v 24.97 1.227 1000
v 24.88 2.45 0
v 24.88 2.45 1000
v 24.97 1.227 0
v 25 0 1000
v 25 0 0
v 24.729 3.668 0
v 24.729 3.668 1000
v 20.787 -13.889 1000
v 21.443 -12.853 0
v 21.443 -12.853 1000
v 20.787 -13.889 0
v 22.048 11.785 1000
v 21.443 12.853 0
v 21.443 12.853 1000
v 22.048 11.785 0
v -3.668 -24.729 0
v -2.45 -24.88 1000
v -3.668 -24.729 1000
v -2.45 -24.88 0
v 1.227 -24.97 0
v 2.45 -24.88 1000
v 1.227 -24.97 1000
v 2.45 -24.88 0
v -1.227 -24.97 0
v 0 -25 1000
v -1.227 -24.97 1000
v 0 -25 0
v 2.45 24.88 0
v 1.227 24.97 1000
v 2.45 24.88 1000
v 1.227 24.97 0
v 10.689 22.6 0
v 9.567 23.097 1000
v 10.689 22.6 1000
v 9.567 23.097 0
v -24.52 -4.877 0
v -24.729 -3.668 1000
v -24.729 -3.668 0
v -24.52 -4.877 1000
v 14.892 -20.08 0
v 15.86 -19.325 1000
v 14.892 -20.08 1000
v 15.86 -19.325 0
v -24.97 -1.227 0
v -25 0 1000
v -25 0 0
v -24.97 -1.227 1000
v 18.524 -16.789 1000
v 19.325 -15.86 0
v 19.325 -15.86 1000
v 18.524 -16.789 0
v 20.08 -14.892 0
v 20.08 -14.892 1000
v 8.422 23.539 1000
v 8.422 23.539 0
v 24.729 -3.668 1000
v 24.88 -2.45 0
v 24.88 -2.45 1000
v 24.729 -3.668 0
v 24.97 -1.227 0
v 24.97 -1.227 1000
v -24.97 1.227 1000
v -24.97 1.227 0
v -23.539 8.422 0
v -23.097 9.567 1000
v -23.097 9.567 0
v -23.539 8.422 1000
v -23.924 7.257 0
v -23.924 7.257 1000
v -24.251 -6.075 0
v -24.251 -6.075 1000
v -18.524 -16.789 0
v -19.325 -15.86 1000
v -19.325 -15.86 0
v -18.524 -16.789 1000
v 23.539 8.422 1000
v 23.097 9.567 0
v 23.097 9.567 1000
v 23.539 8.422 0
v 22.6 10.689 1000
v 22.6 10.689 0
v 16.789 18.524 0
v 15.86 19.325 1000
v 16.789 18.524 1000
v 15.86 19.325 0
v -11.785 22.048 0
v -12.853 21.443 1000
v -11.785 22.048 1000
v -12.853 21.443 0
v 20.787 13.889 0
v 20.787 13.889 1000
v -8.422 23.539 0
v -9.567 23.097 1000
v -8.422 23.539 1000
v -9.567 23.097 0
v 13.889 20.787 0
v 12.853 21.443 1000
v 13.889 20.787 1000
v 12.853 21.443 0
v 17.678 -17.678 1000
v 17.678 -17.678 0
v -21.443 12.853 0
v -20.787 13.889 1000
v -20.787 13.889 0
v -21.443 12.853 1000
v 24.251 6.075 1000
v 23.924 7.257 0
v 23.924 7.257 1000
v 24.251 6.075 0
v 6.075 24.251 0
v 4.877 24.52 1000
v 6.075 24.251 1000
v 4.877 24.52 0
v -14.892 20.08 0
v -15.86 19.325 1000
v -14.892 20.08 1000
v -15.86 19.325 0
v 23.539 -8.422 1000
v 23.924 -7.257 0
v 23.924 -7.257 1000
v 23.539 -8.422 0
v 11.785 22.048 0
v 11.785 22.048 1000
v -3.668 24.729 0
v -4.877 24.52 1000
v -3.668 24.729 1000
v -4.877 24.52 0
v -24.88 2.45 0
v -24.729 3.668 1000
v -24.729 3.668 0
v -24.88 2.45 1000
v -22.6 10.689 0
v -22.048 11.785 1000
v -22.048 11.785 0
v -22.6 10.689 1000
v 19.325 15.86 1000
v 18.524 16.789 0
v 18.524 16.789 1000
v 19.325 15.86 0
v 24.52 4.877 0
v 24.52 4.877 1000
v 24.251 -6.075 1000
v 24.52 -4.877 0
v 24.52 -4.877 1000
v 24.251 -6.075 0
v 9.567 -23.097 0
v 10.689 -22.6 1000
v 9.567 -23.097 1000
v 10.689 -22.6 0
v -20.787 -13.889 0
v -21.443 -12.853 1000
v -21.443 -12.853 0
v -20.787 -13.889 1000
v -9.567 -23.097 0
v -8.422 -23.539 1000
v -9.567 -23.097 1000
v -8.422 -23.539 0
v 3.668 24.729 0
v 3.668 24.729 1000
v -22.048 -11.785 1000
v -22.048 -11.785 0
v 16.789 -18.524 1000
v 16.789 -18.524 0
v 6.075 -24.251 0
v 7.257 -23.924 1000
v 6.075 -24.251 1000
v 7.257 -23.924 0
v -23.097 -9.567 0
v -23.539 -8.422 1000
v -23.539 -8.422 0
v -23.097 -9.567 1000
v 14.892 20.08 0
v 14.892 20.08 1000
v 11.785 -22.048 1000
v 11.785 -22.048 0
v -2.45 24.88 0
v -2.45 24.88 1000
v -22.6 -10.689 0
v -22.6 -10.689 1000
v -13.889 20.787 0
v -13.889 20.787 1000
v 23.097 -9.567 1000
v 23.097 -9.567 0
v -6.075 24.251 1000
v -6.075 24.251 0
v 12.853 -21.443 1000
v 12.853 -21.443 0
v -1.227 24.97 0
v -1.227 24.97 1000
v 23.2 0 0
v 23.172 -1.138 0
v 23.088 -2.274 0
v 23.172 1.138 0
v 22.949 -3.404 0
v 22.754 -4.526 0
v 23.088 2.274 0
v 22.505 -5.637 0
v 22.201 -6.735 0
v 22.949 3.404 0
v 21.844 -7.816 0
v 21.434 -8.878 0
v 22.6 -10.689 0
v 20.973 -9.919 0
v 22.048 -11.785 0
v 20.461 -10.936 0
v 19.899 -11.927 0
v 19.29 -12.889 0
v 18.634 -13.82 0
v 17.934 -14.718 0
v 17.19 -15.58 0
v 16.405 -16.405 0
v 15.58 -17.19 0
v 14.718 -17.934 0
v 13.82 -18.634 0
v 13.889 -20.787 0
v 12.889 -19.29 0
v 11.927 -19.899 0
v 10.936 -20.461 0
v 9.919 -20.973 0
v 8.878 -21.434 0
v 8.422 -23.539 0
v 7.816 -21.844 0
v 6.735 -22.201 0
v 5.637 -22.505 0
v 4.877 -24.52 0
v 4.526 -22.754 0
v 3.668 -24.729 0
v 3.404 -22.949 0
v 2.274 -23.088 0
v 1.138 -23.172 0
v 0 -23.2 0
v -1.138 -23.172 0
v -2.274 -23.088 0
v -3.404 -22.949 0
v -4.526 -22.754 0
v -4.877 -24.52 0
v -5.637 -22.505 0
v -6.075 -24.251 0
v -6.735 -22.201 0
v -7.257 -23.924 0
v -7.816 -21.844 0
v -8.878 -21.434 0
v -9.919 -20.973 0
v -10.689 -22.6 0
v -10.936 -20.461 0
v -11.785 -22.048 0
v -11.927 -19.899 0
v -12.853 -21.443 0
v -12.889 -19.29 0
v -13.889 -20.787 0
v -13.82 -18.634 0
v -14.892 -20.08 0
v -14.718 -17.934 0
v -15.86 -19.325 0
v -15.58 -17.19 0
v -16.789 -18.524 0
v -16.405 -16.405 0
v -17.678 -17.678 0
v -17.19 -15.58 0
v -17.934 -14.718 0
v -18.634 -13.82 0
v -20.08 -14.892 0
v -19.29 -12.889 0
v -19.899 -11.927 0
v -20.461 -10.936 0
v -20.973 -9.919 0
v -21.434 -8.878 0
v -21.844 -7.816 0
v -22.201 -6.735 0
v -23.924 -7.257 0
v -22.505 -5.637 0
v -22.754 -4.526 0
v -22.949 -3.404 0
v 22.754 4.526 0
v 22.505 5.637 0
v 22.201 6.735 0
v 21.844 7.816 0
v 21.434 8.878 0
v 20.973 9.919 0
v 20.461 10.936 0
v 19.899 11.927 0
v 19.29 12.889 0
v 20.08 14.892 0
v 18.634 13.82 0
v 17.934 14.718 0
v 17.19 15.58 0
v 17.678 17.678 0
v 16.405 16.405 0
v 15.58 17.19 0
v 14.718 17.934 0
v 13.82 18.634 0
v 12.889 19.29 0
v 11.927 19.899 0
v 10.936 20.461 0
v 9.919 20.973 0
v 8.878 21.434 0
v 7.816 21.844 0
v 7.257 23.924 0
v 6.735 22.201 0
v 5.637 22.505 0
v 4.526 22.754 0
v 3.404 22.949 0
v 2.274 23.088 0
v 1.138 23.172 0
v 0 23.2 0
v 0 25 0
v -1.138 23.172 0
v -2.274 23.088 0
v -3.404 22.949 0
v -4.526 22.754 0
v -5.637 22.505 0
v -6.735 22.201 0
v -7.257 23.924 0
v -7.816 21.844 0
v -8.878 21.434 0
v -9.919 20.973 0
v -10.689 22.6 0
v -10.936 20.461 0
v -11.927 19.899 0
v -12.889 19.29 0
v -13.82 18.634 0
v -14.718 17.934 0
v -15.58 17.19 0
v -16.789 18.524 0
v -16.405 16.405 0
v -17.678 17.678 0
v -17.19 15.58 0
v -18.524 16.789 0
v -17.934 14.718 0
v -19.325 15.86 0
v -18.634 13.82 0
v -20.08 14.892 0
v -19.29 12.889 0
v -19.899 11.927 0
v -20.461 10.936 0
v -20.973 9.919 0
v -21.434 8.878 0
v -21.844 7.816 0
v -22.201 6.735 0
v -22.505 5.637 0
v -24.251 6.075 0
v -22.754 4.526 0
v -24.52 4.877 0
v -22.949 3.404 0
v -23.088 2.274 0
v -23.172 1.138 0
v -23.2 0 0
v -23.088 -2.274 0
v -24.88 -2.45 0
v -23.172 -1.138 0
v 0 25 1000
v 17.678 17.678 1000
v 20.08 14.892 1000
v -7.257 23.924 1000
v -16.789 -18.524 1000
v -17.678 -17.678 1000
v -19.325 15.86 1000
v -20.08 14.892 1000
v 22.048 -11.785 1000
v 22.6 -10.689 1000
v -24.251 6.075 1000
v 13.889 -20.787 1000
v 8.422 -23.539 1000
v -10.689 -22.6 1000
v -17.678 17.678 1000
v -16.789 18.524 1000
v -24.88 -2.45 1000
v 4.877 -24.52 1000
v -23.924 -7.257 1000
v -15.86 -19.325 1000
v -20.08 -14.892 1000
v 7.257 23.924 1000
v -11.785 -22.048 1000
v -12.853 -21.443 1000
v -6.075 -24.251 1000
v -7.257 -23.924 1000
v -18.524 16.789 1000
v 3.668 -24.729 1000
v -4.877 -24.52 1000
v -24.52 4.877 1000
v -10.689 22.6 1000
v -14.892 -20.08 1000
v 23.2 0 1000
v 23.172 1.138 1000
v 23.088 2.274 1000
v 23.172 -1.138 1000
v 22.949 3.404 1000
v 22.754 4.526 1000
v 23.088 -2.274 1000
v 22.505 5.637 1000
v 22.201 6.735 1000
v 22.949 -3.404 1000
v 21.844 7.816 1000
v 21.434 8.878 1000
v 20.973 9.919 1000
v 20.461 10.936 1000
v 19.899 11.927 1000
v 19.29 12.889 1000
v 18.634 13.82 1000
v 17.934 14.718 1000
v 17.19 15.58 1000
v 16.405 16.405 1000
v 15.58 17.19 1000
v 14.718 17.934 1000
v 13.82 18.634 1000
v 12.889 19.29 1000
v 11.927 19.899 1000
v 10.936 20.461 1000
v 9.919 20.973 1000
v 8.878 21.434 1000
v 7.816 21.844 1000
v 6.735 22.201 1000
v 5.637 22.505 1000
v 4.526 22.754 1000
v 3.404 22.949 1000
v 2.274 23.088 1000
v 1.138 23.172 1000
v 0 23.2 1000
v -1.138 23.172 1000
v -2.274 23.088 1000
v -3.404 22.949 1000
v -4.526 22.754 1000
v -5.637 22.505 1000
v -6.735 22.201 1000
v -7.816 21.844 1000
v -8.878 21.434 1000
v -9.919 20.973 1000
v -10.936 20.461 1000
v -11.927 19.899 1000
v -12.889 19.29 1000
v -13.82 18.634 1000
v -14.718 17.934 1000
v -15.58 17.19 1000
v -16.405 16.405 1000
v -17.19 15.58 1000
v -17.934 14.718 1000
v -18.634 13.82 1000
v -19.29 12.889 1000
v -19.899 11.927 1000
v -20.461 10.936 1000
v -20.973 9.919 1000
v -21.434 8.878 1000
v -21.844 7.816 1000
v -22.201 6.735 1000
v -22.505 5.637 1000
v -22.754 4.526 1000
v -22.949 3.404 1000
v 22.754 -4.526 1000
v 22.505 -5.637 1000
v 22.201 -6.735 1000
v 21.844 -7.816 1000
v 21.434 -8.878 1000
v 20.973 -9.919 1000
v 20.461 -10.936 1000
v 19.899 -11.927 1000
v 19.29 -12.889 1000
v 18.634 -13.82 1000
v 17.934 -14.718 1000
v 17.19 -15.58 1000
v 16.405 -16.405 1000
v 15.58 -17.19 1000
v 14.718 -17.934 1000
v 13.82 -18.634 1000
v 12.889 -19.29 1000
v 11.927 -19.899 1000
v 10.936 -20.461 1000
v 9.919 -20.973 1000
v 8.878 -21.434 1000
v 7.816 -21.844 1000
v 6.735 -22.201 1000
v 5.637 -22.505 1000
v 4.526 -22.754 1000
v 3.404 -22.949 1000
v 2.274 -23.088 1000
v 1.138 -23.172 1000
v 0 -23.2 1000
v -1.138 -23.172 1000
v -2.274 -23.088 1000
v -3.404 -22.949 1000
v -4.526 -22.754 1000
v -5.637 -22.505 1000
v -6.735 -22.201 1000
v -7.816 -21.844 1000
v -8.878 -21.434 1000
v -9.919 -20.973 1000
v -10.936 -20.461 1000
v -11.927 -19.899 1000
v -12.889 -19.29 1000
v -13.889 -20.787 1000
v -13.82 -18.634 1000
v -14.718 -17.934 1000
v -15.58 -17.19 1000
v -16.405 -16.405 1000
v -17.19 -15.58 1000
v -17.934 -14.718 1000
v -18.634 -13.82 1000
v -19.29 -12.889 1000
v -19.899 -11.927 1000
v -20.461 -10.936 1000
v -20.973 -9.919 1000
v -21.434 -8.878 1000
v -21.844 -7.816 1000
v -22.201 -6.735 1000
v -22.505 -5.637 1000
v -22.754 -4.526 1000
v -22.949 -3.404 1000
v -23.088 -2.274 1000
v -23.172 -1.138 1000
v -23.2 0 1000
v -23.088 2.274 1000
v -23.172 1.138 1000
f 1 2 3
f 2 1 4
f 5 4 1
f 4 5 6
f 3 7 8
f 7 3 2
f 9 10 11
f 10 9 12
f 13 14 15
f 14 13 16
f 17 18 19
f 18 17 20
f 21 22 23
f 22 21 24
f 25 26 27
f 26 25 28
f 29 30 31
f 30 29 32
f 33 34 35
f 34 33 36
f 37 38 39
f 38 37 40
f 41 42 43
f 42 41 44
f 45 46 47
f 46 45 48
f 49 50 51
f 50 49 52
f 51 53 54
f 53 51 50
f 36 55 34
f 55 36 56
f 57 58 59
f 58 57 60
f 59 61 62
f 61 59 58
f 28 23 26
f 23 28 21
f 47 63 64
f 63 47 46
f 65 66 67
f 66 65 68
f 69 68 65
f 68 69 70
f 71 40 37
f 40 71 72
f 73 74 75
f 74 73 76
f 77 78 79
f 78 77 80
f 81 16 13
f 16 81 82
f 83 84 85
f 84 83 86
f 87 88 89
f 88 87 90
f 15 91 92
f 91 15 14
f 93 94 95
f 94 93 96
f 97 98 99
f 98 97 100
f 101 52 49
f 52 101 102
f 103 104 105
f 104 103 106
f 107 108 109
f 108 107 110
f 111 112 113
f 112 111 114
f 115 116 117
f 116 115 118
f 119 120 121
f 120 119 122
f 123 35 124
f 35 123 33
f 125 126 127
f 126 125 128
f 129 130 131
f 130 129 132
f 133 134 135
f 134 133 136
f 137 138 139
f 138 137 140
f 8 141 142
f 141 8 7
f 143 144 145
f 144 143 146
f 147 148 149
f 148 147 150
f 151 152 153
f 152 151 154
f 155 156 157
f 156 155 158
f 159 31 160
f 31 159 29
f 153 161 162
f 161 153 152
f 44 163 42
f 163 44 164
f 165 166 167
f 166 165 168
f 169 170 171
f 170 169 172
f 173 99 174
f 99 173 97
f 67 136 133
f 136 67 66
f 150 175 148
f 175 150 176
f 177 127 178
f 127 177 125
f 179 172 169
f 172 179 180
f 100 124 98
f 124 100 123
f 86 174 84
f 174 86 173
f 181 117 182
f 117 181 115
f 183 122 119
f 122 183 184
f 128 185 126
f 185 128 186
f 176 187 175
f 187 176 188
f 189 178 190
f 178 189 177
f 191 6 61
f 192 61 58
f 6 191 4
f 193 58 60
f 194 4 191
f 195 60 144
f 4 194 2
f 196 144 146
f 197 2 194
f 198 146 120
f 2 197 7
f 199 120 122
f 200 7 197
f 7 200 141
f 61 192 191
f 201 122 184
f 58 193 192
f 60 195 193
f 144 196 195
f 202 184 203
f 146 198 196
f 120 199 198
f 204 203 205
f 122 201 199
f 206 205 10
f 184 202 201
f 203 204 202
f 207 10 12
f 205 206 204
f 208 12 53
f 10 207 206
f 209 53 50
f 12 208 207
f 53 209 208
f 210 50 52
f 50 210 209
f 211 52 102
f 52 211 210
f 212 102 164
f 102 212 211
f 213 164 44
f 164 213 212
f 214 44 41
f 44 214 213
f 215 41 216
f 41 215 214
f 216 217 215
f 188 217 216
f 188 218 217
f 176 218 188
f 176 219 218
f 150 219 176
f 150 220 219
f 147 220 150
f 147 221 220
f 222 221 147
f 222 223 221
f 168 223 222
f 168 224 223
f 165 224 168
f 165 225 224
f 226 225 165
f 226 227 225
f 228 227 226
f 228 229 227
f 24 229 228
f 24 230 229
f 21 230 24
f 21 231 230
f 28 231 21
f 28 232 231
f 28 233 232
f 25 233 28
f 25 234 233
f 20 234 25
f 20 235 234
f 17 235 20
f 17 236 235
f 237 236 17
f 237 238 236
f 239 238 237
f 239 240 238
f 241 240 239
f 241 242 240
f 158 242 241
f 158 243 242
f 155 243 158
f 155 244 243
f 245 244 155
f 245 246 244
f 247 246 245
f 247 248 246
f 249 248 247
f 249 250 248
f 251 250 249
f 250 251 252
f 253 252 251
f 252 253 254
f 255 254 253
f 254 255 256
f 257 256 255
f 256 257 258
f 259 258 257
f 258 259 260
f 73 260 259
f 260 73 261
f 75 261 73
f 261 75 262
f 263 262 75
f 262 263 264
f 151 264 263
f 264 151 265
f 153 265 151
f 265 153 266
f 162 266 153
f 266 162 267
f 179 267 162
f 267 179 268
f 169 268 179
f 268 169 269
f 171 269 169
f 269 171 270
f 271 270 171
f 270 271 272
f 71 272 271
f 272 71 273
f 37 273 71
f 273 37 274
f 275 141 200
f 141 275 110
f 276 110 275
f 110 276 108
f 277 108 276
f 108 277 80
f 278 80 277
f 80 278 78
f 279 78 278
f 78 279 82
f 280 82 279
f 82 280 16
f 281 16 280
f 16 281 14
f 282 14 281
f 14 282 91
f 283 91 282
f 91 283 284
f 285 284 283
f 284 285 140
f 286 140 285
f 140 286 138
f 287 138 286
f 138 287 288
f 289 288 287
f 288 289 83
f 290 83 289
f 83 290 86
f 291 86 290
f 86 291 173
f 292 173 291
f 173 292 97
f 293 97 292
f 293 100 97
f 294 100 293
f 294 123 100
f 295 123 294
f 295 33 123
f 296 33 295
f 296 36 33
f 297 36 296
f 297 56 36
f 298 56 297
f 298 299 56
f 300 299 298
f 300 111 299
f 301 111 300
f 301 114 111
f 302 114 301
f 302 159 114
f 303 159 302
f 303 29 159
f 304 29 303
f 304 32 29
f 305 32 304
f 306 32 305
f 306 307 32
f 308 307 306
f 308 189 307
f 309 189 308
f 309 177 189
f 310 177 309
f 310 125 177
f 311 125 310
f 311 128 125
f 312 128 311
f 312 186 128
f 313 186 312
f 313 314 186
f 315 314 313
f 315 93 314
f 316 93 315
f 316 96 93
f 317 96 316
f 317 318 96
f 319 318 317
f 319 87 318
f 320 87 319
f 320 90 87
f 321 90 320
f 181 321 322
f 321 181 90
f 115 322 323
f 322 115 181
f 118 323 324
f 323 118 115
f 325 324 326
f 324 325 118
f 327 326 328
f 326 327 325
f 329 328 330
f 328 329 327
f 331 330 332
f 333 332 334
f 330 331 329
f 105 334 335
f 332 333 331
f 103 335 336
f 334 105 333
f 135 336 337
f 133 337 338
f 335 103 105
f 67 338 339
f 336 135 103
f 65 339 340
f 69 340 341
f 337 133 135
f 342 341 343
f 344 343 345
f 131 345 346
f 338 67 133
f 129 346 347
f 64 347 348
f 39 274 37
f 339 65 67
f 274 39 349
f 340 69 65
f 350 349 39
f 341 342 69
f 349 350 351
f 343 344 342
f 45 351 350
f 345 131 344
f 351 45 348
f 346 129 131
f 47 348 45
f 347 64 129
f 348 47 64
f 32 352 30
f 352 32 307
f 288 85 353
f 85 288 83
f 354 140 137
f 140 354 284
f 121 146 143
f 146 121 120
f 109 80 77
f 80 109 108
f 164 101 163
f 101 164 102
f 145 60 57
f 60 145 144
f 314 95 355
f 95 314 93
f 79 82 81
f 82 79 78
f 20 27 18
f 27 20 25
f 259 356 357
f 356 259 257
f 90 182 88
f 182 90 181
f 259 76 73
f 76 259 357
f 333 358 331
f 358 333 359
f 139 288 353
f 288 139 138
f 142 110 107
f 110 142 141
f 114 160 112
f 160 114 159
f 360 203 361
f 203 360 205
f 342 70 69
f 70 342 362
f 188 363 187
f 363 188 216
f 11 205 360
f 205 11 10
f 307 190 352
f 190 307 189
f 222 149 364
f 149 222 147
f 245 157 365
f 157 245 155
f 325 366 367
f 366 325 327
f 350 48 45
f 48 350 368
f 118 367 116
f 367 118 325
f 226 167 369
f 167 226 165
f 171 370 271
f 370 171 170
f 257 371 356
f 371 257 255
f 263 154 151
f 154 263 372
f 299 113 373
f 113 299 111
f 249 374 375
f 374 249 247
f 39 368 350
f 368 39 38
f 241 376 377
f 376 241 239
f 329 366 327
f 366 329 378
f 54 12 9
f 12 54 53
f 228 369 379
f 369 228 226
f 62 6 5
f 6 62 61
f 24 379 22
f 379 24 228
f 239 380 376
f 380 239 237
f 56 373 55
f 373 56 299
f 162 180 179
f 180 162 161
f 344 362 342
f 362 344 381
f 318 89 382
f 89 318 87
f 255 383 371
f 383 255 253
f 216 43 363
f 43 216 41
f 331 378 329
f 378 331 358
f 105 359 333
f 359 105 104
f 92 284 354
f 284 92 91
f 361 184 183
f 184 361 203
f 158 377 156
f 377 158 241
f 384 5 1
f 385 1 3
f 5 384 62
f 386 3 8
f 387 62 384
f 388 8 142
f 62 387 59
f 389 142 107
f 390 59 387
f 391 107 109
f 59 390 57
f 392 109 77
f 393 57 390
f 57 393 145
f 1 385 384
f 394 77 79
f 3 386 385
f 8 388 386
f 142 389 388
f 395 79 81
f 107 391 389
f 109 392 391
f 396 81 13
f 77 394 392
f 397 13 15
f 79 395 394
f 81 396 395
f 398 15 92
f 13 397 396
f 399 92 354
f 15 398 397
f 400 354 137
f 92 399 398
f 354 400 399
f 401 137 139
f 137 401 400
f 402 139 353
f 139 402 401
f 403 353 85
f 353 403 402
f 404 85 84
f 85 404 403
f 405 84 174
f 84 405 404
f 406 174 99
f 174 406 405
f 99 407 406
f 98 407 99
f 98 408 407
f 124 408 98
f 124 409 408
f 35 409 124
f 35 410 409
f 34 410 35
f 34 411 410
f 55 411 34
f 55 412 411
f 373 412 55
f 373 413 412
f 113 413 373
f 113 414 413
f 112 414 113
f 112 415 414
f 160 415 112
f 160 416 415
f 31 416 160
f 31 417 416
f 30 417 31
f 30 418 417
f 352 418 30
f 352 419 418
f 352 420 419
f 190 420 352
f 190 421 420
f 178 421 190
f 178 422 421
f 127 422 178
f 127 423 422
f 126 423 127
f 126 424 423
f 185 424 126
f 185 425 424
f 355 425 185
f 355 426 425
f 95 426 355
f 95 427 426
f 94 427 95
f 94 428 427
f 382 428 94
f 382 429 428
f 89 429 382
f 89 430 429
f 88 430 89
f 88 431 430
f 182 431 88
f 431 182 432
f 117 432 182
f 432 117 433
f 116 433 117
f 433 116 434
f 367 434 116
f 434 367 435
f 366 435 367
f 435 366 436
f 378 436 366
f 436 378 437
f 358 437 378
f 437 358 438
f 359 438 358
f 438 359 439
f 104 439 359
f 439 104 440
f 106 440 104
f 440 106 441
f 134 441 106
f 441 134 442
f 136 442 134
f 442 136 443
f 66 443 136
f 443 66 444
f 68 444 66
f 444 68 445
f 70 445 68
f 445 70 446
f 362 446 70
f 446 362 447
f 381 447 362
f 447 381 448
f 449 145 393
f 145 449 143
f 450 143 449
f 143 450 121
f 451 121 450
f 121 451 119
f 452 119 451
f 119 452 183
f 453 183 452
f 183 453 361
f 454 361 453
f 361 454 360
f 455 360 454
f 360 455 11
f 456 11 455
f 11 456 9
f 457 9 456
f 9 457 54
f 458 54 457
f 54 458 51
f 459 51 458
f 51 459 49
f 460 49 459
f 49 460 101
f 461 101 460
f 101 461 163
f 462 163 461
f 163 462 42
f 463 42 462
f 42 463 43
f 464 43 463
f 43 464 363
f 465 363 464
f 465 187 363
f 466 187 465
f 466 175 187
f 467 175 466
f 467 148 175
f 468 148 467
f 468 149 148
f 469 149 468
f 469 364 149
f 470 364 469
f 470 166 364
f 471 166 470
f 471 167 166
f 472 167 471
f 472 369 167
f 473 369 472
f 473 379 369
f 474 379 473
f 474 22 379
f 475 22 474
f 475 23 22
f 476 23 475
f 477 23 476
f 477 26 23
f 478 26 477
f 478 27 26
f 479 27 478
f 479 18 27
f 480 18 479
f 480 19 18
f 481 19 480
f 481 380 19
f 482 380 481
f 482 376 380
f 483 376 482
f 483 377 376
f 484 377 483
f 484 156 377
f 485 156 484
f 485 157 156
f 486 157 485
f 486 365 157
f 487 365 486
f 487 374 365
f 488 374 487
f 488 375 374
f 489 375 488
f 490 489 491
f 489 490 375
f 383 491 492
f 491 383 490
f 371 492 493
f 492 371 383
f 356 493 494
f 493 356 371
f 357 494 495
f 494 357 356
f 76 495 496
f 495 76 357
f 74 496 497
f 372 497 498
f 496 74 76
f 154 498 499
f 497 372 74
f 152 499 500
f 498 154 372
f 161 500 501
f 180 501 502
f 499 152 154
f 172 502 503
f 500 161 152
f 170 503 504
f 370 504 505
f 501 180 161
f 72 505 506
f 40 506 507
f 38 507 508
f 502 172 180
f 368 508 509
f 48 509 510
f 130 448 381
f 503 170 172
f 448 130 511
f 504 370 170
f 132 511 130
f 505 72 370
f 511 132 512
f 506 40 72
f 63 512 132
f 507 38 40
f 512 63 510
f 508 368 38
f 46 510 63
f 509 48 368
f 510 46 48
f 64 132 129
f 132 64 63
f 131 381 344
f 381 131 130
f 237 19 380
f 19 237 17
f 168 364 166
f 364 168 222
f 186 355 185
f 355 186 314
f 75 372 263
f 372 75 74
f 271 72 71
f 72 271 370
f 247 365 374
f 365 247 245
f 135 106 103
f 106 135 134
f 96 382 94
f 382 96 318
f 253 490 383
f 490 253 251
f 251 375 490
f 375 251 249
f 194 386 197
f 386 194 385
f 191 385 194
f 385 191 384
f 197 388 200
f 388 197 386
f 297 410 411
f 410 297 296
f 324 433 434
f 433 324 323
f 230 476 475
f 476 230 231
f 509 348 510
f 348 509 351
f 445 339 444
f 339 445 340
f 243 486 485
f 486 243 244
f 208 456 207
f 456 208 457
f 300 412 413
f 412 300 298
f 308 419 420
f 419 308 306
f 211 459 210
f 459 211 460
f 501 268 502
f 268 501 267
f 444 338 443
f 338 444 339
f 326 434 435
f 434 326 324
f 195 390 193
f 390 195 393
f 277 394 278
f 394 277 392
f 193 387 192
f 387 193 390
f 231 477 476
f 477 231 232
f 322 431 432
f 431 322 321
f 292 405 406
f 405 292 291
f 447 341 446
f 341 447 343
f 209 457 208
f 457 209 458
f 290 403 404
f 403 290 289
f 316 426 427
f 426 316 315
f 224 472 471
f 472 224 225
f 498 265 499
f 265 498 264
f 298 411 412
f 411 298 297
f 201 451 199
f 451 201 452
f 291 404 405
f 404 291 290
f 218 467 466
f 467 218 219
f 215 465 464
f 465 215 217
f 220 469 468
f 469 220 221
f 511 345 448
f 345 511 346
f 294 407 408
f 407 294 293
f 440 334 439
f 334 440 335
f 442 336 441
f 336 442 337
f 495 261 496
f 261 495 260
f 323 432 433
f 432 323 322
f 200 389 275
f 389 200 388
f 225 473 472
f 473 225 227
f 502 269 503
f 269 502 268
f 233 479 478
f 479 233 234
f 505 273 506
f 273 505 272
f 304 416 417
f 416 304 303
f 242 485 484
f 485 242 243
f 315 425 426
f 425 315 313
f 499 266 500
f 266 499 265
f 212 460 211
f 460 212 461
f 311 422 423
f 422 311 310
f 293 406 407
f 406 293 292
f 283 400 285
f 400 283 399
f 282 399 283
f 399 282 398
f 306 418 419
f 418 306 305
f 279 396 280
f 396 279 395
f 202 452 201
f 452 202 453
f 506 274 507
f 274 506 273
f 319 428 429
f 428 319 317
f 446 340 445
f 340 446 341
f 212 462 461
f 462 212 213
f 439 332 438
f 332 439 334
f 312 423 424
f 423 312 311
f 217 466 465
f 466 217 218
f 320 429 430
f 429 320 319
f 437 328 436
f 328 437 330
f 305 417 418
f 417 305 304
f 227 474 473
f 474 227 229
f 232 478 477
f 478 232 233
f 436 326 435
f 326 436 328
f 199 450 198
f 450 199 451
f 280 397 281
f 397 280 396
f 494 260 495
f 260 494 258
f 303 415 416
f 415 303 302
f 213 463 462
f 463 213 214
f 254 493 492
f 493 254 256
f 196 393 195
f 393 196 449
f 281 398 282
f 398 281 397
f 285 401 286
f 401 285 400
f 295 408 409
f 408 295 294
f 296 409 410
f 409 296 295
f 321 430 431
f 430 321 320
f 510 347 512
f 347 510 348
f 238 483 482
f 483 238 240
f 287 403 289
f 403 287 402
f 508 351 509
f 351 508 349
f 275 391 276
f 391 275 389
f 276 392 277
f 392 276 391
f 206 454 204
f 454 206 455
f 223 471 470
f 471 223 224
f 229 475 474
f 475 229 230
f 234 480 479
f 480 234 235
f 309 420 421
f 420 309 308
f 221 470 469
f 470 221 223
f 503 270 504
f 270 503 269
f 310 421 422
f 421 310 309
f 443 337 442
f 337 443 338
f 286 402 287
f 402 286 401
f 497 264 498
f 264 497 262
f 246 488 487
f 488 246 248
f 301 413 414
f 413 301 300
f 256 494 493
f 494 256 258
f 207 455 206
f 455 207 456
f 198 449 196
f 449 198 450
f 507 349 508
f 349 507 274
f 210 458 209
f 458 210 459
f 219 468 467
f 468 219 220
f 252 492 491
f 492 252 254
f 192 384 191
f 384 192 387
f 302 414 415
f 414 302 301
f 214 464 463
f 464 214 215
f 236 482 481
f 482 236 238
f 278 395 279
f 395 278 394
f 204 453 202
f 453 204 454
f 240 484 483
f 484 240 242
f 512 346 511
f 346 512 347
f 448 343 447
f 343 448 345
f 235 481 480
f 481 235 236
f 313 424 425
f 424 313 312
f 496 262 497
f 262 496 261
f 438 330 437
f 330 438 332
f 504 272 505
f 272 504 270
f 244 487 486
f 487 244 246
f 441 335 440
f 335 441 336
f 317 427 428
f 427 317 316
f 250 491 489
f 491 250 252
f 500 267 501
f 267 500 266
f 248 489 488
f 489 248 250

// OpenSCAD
$fn = 128;

// HT 50 pipe, length 1000 mm
// Typical HT 50 dimensions (approx.): OD 50 mm, wall 1.8 mm
// Adjust as needed.
pipe_length = 1000;
outer_d = 50;
wall = 1.8;
inner_d = outer_d - 2*wall;

module ht_pipe(len=pipe_length, od=outer_d, id=inner_d) {
    difference() {
        cylinder(h=len, d=od, center=false);
        translate([0,0,-0.1])
            cylinder(h=len+0.2, d=id, center=false);
    }
}

ht_pipe();
